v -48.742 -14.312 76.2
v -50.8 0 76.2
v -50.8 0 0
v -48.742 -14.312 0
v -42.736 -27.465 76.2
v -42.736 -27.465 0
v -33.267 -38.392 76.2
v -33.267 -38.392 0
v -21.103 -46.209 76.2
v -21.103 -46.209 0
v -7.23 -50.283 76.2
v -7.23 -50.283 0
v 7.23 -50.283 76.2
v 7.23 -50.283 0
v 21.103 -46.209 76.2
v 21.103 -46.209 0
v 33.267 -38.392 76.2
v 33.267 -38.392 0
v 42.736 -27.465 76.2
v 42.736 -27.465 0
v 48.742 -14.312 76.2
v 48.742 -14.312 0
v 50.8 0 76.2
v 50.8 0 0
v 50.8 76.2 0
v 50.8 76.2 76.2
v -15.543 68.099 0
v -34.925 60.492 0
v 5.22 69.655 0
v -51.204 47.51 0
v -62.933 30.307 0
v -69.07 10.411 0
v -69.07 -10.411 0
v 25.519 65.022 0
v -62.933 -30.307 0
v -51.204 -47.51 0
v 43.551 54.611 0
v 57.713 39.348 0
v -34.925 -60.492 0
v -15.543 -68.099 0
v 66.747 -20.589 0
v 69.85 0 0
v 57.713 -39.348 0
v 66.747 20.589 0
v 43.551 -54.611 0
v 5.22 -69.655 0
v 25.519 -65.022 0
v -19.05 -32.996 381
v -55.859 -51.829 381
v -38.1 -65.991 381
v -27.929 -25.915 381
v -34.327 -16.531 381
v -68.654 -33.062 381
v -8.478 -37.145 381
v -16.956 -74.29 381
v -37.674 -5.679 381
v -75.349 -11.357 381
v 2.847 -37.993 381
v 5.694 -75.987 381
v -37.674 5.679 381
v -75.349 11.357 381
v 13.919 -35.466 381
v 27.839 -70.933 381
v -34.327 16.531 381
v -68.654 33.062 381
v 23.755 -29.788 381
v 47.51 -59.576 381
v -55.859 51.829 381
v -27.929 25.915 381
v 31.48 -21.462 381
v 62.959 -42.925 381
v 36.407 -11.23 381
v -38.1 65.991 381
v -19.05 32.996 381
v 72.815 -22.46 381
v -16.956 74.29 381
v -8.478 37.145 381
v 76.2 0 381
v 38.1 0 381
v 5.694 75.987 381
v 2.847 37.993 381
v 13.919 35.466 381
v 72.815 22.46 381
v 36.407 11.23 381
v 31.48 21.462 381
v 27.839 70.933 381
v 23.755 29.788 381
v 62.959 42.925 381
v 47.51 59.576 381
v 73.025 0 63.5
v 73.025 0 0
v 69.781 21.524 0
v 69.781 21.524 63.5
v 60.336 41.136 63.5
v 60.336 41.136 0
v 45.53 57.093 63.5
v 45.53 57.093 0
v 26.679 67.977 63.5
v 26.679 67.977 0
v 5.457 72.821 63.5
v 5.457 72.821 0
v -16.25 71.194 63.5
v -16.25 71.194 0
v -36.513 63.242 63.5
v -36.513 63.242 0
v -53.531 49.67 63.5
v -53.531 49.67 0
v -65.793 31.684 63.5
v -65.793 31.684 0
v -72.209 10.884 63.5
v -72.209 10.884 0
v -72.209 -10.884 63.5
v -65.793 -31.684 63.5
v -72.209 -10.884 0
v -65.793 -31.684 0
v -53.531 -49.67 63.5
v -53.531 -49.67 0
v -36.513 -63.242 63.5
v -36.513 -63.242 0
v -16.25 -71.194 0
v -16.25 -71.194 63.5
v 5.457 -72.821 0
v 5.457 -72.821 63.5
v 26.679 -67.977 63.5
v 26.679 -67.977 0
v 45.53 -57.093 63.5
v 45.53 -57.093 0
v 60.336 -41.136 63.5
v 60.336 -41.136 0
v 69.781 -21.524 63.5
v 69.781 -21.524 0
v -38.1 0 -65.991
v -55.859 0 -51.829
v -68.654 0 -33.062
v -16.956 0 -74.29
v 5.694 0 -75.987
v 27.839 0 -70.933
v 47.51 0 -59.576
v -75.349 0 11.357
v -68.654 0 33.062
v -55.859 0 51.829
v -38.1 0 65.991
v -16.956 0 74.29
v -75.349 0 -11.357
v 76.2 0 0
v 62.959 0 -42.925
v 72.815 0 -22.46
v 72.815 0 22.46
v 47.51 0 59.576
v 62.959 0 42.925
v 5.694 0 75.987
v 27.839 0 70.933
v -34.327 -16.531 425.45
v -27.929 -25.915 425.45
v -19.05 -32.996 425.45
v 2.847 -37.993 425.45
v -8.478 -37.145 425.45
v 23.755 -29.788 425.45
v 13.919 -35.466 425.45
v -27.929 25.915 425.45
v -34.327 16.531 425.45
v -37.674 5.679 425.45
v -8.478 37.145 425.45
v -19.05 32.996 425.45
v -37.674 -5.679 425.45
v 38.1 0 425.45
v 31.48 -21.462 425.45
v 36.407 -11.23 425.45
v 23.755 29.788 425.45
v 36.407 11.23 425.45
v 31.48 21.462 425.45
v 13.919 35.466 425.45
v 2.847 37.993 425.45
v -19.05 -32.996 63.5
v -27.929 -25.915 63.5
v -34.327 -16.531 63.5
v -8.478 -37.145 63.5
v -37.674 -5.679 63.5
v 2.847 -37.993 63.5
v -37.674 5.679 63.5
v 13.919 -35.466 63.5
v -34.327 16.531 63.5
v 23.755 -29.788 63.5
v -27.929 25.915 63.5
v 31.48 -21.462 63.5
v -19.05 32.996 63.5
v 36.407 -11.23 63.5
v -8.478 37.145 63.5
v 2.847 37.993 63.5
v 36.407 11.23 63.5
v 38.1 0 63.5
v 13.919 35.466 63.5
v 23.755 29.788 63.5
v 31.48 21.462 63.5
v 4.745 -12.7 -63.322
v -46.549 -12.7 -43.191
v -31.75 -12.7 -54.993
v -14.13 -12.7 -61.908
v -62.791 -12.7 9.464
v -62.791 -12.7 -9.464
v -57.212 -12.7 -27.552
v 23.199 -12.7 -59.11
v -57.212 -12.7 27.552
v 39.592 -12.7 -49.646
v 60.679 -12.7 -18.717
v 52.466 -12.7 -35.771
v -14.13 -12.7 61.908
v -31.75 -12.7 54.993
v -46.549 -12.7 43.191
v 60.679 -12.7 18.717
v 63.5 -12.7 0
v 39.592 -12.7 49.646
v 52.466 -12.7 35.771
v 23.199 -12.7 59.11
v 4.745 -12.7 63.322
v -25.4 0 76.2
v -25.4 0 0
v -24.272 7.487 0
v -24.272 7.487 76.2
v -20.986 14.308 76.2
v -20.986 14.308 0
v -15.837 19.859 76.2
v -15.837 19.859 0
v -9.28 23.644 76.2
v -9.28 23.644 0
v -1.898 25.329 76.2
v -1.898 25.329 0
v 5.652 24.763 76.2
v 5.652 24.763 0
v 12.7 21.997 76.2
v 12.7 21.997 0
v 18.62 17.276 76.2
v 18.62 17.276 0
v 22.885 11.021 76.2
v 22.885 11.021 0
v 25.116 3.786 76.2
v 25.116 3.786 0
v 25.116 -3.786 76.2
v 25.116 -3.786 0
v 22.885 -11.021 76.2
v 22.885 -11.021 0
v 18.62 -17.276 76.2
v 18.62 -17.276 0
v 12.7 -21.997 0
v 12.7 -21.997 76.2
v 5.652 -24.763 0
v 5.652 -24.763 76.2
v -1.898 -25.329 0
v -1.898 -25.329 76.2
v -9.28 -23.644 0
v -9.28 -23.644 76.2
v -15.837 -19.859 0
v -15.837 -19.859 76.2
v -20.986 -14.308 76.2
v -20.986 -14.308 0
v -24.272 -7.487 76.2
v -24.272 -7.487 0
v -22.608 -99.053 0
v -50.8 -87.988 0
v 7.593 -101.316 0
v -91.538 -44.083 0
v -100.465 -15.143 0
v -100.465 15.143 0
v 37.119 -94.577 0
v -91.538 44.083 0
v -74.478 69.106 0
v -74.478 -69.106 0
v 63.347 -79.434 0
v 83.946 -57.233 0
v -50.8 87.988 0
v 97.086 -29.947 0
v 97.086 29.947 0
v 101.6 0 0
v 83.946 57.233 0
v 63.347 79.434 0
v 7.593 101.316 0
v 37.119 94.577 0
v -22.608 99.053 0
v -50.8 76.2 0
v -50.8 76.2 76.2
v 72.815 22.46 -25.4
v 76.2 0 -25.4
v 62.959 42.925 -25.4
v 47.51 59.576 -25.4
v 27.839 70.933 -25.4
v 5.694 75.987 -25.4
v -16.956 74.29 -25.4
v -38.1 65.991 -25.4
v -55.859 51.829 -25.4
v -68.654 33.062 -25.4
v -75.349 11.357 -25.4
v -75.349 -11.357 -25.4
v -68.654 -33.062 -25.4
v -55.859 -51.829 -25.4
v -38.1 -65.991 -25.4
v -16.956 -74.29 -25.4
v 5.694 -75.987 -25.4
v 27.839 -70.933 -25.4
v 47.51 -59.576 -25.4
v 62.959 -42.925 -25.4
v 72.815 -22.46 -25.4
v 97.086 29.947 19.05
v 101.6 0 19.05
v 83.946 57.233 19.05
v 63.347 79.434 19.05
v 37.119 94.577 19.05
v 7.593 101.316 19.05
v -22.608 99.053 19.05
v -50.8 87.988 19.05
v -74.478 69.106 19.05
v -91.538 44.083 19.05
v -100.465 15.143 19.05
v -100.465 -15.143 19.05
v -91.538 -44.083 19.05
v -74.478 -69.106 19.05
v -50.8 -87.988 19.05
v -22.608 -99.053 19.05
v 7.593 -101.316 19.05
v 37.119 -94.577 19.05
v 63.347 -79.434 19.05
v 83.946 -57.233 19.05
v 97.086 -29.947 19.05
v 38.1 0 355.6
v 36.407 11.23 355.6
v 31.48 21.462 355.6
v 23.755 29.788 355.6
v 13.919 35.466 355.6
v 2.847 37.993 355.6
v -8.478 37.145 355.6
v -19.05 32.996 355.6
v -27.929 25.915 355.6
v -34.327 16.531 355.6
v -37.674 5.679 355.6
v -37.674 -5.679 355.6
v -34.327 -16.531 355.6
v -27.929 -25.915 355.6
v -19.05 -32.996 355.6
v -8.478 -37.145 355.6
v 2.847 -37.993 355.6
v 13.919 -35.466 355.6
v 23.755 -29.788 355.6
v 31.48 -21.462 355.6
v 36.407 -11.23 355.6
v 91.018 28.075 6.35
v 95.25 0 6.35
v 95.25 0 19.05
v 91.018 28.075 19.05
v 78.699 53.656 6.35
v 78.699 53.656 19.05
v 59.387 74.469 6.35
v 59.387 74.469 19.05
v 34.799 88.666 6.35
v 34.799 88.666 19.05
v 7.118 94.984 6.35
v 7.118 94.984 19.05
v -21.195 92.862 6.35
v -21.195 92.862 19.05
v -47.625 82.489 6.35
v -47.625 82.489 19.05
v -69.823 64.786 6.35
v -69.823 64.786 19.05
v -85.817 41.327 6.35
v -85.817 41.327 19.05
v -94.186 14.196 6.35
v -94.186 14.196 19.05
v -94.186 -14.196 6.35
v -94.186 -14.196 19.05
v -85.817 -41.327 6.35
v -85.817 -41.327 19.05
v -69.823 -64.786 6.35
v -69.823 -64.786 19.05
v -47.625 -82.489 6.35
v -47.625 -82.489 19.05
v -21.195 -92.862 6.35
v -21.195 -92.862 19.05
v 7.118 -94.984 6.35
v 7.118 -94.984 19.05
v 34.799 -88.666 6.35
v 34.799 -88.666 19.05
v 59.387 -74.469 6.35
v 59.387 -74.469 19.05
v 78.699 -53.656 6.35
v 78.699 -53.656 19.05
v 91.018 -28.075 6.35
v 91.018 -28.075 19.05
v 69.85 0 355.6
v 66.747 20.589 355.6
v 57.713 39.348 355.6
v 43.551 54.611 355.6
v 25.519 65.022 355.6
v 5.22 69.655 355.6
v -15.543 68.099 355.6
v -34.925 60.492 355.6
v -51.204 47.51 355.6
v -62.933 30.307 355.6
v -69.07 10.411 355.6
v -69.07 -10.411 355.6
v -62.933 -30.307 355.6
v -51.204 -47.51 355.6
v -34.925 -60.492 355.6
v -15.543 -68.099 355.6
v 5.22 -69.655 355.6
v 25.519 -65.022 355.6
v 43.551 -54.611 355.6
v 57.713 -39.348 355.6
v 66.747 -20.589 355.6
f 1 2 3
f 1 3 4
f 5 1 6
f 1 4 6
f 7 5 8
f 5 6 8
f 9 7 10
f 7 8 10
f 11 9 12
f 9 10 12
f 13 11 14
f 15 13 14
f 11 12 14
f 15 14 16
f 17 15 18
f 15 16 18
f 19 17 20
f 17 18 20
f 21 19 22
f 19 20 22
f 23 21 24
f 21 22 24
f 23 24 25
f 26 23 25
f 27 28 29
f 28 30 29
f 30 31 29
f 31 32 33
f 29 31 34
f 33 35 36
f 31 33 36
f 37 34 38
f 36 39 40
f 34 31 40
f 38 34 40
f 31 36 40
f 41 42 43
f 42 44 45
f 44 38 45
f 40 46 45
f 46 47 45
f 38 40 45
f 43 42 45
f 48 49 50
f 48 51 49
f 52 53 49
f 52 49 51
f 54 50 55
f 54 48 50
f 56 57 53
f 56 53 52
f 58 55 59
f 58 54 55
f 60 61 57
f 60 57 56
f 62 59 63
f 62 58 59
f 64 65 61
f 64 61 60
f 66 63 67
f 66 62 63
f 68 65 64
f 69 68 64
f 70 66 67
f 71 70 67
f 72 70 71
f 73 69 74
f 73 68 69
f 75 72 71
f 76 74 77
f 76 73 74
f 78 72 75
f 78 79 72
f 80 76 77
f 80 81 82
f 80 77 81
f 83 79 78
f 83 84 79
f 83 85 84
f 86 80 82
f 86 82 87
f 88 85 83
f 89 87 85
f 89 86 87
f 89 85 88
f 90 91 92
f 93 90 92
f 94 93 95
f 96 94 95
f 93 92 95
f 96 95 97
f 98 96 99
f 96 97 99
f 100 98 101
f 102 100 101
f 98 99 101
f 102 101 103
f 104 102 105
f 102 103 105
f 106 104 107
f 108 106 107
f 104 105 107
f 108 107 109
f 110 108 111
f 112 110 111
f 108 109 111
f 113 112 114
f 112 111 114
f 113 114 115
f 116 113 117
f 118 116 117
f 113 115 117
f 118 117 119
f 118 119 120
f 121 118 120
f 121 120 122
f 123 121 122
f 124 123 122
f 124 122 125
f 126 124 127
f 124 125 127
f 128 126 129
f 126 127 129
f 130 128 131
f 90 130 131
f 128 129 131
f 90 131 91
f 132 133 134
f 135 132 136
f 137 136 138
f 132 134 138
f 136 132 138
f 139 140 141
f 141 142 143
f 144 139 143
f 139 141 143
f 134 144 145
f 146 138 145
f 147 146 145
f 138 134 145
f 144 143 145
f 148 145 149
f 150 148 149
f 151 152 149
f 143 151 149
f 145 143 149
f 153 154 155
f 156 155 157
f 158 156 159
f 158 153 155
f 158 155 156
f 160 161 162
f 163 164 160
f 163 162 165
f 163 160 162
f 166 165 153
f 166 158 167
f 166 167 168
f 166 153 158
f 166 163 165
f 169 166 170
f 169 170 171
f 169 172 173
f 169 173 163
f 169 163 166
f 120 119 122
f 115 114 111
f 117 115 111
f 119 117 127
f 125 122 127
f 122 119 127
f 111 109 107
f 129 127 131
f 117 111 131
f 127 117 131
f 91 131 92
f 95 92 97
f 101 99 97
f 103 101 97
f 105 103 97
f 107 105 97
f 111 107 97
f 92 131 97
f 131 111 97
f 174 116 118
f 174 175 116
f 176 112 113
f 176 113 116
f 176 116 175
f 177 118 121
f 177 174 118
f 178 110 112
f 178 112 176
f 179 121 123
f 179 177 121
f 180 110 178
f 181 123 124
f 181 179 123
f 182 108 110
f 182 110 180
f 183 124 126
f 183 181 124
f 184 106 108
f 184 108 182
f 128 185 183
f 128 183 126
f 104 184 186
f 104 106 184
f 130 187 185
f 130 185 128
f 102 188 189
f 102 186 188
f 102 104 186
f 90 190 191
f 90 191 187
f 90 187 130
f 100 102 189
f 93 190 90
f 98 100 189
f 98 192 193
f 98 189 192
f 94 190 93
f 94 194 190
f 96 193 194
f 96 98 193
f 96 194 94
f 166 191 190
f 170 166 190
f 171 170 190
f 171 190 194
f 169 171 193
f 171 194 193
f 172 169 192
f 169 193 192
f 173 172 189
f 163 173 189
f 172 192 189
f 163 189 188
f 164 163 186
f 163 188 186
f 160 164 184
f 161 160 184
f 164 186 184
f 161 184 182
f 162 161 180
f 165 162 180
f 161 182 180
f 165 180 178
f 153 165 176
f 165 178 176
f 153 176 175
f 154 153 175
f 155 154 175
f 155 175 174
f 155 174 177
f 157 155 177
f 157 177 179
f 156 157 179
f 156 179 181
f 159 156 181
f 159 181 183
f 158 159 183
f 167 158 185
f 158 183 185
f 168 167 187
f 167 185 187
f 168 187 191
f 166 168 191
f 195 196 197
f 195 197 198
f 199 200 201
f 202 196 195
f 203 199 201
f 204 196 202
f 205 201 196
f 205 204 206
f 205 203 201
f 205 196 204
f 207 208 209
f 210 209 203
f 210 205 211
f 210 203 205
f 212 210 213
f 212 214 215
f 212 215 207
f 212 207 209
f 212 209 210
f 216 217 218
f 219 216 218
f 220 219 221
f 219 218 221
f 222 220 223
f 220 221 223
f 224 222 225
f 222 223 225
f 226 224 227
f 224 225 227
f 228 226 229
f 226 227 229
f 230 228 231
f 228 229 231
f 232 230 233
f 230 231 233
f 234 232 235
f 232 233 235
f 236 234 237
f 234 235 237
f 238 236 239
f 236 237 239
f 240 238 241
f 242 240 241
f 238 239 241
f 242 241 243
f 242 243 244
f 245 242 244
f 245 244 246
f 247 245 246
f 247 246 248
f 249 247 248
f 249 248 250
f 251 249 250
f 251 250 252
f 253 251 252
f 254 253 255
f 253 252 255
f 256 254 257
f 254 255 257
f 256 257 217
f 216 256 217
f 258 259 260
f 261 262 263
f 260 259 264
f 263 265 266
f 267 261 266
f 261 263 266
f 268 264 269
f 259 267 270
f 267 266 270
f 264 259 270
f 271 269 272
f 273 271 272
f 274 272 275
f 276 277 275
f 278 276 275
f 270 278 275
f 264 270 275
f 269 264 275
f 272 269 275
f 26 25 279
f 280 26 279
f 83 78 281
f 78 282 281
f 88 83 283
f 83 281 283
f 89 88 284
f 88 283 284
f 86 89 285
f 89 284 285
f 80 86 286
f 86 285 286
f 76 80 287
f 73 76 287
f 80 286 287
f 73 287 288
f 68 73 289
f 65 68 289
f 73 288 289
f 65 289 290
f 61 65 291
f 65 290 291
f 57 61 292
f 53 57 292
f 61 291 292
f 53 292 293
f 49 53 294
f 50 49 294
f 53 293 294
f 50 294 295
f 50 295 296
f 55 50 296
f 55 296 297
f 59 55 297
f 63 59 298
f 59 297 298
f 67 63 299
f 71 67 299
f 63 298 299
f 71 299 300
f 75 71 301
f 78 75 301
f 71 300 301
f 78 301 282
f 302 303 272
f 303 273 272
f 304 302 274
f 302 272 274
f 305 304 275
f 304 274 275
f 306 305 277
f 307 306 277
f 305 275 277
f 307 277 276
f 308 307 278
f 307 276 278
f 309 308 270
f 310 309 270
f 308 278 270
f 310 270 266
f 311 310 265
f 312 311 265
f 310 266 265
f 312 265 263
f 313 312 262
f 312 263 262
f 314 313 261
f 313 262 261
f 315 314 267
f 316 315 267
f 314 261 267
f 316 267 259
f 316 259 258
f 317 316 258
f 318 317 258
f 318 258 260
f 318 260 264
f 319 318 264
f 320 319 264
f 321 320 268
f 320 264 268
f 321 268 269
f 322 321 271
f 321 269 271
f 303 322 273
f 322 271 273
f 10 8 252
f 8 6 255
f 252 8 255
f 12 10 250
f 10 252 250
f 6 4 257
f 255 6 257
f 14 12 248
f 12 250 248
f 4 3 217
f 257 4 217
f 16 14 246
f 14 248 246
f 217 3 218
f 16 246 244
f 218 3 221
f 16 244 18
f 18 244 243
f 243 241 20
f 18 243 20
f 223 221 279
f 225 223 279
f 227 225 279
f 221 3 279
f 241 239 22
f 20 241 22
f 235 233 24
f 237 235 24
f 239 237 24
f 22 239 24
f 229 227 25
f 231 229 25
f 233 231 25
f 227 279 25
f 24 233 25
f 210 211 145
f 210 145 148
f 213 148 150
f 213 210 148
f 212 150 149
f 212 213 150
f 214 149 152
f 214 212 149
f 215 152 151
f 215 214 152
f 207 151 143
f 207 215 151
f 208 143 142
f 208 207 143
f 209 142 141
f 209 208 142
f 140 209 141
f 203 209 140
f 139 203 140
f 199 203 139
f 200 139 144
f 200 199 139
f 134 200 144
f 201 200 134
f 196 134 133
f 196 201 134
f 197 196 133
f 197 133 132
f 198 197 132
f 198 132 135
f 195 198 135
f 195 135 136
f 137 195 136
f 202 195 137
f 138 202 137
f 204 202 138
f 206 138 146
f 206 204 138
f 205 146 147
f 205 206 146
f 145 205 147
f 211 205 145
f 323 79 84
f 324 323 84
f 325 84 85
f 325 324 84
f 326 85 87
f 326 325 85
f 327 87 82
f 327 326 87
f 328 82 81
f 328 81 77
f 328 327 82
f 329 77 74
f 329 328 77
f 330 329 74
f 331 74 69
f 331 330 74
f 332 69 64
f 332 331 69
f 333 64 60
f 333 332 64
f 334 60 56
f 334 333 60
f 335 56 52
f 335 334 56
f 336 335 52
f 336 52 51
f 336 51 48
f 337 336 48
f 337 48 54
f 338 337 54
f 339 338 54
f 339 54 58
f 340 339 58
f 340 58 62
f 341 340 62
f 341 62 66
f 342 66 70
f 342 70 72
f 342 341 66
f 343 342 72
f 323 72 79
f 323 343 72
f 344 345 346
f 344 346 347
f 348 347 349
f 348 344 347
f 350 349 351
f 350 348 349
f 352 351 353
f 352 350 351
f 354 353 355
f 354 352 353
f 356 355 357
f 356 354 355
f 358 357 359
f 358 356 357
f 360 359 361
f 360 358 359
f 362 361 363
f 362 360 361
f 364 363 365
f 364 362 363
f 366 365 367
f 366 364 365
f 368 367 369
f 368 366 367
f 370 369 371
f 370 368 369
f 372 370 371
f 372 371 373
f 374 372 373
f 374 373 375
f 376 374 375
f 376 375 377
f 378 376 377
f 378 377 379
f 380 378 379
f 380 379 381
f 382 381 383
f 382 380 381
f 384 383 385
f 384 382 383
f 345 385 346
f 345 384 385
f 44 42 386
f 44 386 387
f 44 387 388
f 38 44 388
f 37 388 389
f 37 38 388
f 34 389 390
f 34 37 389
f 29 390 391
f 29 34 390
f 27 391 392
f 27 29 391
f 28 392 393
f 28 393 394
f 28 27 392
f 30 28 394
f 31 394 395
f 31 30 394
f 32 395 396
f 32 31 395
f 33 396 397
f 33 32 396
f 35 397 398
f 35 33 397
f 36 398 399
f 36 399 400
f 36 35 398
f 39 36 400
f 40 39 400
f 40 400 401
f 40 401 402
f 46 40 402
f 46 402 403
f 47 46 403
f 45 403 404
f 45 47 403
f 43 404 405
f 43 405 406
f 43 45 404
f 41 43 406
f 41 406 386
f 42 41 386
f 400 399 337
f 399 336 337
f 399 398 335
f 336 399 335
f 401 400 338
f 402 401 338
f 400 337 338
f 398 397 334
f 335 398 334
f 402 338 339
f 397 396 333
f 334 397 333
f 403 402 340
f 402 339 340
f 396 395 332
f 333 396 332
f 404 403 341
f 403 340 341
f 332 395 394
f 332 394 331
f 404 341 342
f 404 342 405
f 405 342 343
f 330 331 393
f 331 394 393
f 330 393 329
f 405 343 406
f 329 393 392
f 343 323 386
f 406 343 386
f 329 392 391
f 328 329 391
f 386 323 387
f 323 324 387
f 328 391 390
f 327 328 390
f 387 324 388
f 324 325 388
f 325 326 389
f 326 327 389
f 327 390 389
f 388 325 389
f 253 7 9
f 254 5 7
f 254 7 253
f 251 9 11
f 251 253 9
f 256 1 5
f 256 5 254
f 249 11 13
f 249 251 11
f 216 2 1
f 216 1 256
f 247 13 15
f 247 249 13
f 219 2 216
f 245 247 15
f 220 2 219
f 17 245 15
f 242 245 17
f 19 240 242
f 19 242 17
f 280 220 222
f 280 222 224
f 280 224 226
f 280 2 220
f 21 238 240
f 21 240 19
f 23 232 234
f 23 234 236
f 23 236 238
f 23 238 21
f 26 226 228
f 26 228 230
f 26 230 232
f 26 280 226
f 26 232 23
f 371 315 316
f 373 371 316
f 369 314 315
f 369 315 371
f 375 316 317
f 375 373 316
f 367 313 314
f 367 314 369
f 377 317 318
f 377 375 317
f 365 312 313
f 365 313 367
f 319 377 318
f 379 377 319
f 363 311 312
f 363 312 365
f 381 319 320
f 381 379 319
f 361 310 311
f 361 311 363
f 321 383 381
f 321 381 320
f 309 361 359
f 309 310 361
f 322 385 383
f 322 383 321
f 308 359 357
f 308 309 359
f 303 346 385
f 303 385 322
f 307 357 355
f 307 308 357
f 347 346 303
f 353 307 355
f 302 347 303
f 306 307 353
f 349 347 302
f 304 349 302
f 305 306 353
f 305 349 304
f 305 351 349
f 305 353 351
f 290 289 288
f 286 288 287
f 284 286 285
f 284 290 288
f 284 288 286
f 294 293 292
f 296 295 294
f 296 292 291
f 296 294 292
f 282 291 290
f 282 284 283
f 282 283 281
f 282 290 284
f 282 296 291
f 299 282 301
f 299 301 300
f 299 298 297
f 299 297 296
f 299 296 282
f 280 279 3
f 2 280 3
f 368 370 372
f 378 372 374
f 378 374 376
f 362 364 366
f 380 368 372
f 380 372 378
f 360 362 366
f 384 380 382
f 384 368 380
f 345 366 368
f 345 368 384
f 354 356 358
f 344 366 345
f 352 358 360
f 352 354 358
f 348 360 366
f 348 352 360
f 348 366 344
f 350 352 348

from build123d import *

# Parameters (mm, degrees)
F1_DEPTH  = 76.2
F2_R      = 76.2
F3_DEPTH  = 12.7
F4_SIZE   = 12.69999
F5_R      = 76.2
F5_R_2    = 69.85
F6_DEPTH  = 355.6
F7_R      = 76.2
F8_DEPTH  = 25.4
F9_R      = 76.2
F9_R_2    = 38.1
F10_DEPTH = 25.4
F11_R     = 101.6
F12_DEPTH = 6.35
F13_R     = 101.6
F13_R_2   = 95.25
F14_DEPTH = 12.7
F15_R     = 73.025
F16_DEPTH = 63.5
F17_R     = 38.1
F18_DEPTH = 361.95


# Not quite as in the source:
# - a fillet or chamfer is up to 0.001 mm smaller than in the source, because OpenCascade refuses the exact size


with BuildPart() as f1:
    # F0 (on Top) → F1 (new body)
    with BuildSketch(Plane.XY):
        with BuildLine():
            Line((-25.4, 0), (-50.8, 0))
            ThreePointArc((-50.8, 0), (0, -50.8), (50.8, 0))
            Line((50.8, 0), (25.4, 0))
            ThreePointArc((25.4, 0), (0, -25.4), (-25.4, 0))
        make_face()
        with BuildLine():
            Line((-50.8, 76.2), (-50.8, 0))
            Line((-50.8, 0), (-25.4, 0))
            ThreePointArc((-25.4, 0), (0, 25.4), (25.4, 0))
            Line((25.4, 0), (50.8, 0))
            Line((50.8, 0), (50.8, 76.2))
            Line((50.8, 76.2), (-50.8, 76.2))
        make_face()
    extrude(amount=F1_DEPTH)


with BuildPart() as f3:
    # F2 (on Front) → F3 (new body)
    with BuildSketch(Plane.XZ):
        Circle(F2_R)
    extrude(amount=F3_DEPTH)

    # F4 (size 12.7 in the source; OpenCascade refuses exactly that, so slightly less here)
    f4_edges = [f3.edges().sort_by_distance(p)[0] for p in [
        (-76.2, -12.7, 0),
    ]]
    chamfer(f4_edges, length=F4_SIZE)


with BuildPart() as f6:
    # F5 (on Top) → F6 (new body)
    with BuildSketch(Plane.XY):
        Circle(F5_R)
        Circle(F5_R_2, mode=Mode.SUBTRACT)
    extrude(amount=F6_DEPTH)

    # F7 (on face) → F8 (join)
    with BuildSketch(Plane(origin=(0, 0, 0), x_dir=(1, 0, 0), z_dir=(0, 0, -1))):
        Circle(F7_R)
    extrude(amount=F8_DEPTH)

    # F9 (on face) → F10 (join)
    with BuildSketch(Plane.XY.offset(355.6)):
        Circle(F9_R)
        Circle(F9_R_2, mode=Mode.SUBTRACT)
    extrude(amount=F10_DEPTH)


with BuildPart() as f12:
    # F11 (on Top) → F12 (new body)
    with BuildSketch(Plane.XY):
        Circle(F11_R)
    extrude(amount=F12_DEPTH)

    # F13 (on face) → F14 (join)
    with BuildSketch(Plane.XY.offset(6.35)):
        Circle(F13_R)
        Circle(F13_R_2, mode=Mode.SUBTRACT)
    extrude(amount=F14_DEPTH)


with BuildPart() as f16:
    # F15 (on Top) → F16 (new body)
    with BuildSketch(Plane.XY):
        Circle(F15_R)
    extrude(amount=F16_DEPTH)

    # F17 (on face) → F18 (join)
    with BuildSketch(Plane.XY.offset(63.5)):
        Circle(F17_R)
    extrude(amount=F18_DEPTH)


solid = Compound([f1.part, f3.part, f6.part, f12.part, f16.part])
